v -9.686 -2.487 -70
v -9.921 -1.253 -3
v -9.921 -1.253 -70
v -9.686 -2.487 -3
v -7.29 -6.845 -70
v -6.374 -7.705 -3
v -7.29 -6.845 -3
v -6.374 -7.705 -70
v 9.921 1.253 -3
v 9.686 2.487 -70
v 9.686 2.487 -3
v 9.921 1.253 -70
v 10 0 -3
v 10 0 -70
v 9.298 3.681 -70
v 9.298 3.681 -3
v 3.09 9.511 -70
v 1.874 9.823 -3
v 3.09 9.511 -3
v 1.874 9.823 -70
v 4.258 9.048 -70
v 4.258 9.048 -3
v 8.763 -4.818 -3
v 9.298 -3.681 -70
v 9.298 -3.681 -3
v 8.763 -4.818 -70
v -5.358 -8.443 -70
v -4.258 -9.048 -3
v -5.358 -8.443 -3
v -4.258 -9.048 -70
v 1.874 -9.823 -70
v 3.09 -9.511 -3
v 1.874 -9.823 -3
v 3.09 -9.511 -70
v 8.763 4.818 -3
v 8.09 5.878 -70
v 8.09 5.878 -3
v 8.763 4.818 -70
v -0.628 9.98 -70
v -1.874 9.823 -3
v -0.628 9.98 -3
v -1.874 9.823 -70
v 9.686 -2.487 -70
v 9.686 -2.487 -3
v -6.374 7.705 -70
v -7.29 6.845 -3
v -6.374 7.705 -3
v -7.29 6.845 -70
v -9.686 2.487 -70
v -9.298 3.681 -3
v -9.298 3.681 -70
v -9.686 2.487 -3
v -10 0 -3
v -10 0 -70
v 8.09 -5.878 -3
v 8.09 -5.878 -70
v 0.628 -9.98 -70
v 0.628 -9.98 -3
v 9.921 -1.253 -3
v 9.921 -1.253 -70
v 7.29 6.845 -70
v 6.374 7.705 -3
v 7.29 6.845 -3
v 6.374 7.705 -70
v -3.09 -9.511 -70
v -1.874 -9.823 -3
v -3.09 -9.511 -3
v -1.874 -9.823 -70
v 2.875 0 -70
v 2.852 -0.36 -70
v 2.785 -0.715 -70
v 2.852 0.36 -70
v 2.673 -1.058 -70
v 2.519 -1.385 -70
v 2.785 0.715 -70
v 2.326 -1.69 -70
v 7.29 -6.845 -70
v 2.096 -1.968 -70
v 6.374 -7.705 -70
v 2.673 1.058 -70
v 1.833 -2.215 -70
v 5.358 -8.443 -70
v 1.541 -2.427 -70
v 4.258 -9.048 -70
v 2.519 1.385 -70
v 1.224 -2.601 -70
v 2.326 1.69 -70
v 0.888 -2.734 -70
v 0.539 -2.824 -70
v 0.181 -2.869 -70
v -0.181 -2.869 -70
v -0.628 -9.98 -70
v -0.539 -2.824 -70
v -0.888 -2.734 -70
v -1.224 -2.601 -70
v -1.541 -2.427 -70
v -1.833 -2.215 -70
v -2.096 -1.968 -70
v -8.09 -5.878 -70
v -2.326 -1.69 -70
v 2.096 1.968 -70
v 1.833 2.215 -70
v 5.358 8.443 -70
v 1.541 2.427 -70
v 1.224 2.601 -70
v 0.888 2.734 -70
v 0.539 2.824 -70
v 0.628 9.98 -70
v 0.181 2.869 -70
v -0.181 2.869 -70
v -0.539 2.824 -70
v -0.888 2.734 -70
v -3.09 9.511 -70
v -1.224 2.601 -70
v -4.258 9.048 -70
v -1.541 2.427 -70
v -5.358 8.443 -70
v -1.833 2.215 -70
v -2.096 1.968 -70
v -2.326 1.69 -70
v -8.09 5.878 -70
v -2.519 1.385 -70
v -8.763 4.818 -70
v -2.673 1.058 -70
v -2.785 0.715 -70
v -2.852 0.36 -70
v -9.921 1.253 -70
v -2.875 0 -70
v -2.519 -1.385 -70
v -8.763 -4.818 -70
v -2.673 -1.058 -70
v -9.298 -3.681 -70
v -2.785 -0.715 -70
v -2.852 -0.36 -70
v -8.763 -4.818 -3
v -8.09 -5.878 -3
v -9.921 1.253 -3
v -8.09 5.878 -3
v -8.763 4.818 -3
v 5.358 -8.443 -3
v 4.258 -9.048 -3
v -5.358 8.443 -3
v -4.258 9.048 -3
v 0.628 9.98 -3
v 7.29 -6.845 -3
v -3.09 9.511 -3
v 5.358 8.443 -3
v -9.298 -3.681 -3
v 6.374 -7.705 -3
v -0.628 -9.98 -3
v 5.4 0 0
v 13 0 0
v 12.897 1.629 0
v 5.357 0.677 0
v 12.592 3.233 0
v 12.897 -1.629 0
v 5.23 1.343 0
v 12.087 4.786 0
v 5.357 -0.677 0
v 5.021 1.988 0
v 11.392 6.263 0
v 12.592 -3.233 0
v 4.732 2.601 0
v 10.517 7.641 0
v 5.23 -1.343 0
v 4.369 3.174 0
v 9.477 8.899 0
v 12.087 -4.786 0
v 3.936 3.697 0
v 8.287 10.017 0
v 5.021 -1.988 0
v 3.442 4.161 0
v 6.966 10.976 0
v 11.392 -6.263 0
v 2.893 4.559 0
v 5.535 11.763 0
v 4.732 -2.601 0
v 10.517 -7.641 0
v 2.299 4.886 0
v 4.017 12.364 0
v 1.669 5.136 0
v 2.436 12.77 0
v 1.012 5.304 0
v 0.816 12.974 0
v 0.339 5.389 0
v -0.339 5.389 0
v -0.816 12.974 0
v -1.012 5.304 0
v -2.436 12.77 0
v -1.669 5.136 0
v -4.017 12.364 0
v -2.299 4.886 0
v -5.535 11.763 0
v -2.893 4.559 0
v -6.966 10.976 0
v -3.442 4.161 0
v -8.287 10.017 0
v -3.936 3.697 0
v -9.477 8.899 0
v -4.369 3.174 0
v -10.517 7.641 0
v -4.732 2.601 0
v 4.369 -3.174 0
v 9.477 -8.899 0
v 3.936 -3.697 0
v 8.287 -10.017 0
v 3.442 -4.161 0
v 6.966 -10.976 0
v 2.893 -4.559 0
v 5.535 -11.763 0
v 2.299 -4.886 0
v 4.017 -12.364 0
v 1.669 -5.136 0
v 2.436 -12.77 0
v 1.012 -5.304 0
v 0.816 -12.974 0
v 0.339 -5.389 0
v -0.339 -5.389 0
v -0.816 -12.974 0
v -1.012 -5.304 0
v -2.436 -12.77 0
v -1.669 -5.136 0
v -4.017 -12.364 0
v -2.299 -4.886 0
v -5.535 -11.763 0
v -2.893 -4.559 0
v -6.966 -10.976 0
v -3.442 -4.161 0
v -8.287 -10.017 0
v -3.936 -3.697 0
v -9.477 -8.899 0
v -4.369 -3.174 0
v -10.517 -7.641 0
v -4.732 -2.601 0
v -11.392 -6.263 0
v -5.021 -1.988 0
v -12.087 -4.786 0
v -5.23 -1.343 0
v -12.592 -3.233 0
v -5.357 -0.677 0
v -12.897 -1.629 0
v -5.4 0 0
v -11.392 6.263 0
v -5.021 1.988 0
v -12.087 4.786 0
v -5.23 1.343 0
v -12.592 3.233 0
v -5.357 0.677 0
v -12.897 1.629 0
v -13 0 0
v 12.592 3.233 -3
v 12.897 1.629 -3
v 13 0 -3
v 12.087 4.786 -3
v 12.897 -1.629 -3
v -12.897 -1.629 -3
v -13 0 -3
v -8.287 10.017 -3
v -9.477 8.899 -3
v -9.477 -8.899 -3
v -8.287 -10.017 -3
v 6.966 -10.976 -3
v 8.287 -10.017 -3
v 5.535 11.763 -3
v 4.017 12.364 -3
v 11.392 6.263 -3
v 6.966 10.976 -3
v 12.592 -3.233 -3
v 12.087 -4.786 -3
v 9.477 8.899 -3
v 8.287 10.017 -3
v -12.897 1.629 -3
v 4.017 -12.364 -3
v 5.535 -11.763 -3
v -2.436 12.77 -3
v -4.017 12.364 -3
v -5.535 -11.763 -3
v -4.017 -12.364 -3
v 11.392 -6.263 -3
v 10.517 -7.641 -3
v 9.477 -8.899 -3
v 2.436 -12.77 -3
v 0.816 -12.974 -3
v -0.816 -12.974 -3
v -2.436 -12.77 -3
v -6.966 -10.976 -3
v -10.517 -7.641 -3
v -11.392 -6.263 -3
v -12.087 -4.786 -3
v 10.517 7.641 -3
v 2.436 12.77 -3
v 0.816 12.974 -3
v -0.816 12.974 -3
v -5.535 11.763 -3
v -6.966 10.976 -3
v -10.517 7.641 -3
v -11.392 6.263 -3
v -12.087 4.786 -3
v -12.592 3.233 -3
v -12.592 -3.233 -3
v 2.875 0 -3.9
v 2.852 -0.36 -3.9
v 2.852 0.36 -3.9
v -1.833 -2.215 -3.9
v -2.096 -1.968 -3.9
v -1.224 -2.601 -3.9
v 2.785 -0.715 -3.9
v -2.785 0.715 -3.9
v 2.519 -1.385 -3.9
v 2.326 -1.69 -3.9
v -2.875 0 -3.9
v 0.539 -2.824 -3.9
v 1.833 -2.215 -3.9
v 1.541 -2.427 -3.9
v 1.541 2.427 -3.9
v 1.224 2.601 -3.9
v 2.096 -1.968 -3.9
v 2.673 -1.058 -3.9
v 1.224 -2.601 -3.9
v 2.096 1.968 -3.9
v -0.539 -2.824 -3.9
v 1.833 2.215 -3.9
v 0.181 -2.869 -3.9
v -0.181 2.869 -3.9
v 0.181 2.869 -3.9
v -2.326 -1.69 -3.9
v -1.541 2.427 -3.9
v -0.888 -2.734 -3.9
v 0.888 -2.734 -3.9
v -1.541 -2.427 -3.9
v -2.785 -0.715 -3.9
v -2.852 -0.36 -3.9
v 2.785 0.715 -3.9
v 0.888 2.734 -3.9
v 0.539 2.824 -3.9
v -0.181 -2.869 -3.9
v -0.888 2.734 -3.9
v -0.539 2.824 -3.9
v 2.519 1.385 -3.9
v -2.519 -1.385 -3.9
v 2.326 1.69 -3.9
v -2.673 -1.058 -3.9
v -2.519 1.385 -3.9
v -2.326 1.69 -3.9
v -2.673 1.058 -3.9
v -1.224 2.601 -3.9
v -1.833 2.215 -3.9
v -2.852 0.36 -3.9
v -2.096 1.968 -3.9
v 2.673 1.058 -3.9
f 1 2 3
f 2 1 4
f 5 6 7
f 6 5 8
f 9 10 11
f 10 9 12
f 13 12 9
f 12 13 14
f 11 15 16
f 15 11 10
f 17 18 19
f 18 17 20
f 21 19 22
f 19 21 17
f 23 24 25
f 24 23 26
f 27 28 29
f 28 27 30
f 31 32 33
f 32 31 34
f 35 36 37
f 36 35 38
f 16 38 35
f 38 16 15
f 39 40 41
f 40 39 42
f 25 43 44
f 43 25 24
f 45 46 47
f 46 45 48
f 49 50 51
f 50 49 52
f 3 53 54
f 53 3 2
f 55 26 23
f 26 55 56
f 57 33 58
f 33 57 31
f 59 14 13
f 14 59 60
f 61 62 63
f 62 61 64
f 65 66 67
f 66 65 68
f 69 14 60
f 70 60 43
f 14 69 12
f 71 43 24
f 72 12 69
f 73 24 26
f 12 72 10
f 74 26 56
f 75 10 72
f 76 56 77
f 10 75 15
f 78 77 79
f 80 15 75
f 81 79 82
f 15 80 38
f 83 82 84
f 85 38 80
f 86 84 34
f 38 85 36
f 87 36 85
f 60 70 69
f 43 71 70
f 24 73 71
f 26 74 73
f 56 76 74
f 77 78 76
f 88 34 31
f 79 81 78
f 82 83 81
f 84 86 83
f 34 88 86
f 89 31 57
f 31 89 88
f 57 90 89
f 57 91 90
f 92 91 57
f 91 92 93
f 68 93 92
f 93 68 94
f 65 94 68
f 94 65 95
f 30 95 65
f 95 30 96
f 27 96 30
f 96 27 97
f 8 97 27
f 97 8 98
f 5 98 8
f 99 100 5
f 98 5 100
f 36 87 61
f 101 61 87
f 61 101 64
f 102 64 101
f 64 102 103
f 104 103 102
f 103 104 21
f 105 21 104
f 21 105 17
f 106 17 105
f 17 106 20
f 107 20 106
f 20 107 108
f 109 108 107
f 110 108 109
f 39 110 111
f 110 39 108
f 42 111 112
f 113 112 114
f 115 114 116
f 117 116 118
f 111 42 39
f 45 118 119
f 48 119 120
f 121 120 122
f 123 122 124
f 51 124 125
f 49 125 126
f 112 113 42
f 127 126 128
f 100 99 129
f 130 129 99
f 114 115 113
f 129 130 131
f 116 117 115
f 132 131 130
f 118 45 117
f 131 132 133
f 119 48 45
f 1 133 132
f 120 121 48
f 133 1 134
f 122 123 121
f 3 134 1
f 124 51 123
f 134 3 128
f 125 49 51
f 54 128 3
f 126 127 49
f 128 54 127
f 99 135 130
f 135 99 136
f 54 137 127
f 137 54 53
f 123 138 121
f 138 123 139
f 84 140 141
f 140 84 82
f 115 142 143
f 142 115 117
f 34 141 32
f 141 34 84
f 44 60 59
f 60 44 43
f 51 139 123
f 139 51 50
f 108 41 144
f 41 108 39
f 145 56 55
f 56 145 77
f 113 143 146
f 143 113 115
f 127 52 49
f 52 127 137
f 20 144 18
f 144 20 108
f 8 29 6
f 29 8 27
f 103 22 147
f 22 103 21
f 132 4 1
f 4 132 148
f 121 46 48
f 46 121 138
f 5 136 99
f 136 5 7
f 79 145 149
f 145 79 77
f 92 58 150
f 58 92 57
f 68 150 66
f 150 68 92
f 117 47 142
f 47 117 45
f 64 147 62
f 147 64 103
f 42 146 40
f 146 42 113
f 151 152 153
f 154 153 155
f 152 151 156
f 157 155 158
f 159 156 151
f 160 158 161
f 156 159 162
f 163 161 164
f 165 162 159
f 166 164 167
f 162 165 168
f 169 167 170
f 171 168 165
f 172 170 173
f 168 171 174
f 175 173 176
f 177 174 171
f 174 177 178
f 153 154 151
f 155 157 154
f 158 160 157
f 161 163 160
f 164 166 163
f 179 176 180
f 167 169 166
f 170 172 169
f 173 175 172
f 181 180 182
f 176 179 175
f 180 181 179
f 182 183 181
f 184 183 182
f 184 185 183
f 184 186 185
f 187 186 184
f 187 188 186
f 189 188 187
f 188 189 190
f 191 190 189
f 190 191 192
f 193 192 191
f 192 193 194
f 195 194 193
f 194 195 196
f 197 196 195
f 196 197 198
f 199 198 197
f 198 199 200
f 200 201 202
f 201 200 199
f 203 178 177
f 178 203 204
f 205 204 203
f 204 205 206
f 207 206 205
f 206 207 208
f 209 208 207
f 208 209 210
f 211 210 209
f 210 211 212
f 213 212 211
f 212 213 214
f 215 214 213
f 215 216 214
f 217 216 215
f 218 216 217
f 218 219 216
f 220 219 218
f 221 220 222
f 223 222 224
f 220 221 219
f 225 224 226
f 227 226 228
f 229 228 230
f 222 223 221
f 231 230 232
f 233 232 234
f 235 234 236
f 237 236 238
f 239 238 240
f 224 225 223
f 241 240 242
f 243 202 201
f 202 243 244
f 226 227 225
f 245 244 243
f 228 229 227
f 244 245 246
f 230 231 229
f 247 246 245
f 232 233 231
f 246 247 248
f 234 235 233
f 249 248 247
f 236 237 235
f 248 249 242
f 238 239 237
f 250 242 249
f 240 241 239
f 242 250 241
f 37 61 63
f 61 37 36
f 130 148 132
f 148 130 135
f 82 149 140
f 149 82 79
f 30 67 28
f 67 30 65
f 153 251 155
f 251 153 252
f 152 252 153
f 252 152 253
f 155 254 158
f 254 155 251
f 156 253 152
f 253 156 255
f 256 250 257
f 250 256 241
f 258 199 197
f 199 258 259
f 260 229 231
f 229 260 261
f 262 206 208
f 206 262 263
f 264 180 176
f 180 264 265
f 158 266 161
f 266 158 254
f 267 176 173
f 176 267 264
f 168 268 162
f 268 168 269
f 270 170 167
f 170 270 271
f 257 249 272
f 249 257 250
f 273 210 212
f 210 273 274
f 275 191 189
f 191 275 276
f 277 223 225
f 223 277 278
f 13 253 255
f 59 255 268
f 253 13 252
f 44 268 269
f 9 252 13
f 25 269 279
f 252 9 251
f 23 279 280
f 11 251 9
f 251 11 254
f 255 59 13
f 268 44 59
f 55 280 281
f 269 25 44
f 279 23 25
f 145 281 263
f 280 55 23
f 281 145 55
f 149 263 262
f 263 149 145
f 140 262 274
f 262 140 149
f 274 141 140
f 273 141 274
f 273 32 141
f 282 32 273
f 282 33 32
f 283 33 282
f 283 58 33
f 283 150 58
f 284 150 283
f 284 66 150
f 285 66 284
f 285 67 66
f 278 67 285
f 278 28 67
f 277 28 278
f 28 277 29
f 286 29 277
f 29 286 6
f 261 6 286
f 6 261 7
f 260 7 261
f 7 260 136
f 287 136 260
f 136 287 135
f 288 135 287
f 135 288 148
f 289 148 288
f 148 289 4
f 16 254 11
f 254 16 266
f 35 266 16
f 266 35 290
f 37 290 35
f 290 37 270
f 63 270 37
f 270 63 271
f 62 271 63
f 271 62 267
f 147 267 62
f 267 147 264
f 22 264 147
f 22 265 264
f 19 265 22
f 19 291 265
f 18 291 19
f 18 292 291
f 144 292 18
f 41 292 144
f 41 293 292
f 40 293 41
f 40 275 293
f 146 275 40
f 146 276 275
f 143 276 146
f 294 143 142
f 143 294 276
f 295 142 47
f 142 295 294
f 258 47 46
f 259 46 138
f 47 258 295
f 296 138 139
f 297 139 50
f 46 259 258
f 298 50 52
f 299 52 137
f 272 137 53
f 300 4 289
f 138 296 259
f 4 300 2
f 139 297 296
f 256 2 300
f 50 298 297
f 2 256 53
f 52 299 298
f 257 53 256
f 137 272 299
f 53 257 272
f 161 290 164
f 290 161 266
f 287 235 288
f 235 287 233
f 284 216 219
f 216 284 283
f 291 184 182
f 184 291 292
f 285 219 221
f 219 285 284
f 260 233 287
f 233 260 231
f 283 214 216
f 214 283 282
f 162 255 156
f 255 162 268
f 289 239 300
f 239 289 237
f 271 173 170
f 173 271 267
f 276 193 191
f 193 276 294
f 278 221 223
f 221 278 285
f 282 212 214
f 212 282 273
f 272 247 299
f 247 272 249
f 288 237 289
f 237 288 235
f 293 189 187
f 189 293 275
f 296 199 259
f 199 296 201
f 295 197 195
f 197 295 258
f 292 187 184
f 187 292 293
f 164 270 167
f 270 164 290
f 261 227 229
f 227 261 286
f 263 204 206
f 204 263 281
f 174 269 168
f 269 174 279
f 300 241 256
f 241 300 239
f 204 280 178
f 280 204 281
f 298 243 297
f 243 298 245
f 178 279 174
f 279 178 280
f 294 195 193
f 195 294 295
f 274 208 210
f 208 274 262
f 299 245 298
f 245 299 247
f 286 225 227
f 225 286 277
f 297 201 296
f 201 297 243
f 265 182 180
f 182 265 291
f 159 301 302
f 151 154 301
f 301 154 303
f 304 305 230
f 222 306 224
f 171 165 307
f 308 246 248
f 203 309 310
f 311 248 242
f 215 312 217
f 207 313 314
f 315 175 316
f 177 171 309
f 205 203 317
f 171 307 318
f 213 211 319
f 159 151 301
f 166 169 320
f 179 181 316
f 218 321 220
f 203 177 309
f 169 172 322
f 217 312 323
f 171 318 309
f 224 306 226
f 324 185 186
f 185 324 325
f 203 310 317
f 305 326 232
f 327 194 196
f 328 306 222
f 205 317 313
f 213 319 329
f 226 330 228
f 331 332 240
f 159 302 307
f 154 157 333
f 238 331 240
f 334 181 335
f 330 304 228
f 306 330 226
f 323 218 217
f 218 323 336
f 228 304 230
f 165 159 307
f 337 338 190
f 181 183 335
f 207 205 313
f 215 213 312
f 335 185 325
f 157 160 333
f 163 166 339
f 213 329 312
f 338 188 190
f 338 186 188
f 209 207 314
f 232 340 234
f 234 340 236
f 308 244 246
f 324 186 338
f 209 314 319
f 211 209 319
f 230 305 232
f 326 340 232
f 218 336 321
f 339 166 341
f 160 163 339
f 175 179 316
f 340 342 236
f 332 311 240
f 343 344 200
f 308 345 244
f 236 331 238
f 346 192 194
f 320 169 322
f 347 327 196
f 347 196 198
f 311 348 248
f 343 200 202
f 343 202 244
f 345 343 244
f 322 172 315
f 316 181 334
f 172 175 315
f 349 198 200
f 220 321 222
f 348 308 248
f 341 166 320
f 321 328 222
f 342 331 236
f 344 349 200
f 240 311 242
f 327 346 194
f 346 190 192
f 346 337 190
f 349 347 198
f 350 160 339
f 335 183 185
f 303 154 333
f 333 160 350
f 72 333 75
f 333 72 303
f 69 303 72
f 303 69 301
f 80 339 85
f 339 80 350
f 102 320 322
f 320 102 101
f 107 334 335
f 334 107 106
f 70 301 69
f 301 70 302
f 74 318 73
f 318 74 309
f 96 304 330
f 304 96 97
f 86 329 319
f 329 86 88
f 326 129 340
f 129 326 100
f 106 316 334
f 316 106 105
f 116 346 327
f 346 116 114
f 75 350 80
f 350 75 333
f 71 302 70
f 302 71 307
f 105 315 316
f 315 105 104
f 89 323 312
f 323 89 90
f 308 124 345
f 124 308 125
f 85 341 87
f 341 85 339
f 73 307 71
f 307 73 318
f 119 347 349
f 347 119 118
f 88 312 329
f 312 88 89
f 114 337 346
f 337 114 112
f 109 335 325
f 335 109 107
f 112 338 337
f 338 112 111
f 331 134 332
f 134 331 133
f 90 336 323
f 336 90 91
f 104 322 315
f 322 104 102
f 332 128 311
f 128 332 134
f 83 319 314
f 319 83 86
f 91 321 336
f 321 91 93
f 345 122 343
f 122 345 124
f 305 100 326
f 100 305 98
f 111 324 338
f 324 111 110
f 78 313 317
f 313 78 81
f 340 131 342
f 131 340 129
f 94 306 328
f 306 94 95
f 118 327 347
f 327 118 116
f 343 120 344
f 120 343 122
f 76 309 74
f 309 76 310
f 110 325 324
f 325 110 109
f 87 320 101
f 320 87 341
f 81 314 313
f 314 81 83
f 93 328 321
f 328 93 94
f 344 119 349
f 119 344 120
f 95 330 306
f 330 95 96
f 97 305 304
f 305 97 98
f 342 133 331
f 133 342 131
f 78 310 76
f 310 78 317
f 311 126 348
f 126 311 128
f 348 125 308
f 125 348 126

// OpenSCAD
$fn = 50;


difference() {
	union() {
		translate(v = [0, 0, -70.0000000000]) {
			cylinder(h = 70, r = 10.0000000000);
		}
		translate(v = [0, 0, -3.0000000000]) {
			cylinder(h = 3, r = 13.0000000000);
		}
	}
	union() {
		translate(v = [0, 0, 0]) {
			rotate(a = [0, 0, 0]) {
				difference() {
					union() {
						#translate(v = [0, 0, -70.0000000000]) {
							cylinder(h = 70, r = 2.6000000000);
						}
						#translate(v = [0, 0, -3.9000000000]) {
							cylinder(h = 3.9000000000, r = 10.0000000000, r1 = 2.8750000000, r2 = 5.4000000000);
						}
						#translate(v = [0, 0, -70.0000000000]) {
							cylinder(h = 70, r = 2.8750000000);
						}
						#translate(v = [0, 0, -70.0000000000]) {
							cylinder(h = 70, r = 2.6000000000);
						}
					}
					union();
				}
			}
		}
	}
}
